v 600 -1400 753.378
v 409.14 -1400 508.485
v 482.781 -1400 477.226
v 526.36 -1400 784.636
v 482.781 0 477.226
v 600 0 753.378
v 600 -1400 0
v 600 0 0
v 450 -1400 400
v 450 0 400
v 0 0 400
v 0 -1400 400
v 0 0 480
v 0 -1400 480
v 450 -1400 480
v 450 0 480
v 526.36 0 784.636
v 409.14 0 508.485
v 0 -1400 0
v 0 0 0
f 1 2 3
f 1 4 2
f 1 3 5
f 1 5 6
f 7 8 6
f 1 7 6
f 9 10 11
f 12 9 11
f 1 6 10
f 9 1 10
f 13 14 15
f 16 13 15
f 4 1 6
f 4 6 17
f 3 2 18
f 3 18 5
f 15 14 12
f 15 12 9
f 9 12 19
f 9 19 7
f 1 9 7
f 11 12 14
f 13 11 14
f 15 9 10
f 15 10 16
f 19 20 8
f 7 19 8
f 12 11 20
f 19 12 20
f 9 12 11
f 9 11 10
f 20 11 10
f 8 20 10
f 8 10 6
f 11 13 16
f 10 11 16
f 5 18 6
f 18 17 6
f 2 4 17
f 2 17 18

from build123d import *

# Parameters (mm, degrees)
F1_DEPTH = 1400
F2_W     = 450
F2_H     = 80
F3_DEPTH = 1400


with BuildPart() as f1:
    # F0 (on Front) → F1 (new body)
    with BuildSketch(Plane.XZ):
        Polygon((0, 400), (0, 0), (600, 0), (600, 400), (450, 400), align=None)
        Polygon((450, 400), (600, 400), (600, 753.3778548736), (482.7806614532, 477.2263988378), align=None)
    extrude(amount=F1_DEPTH)


with BuildPart() as f3:
    # F2 (on face) → F3 (new body)
    with BuildSketch(Plane.XZ.offset(1400)):
        with Locations((225, 440)):
            Rectangle(F2_W, F2_H)
    extrude(amount=-F3_DEPTH)


with BuildPart() as f3b:
    # F2 (on face) → F3, piece 2 (new body)
    with BuildSketch(Plane.XZ.offset(1400)):
        Polygon((409.140273177, 508.484889117), (482.7806614532, 477.2263988378), (600, 753.3778548736), (526.3596117238, 784.6363451527), align=None)
    extrude(amount=-F3_DEPTH)


solid = Compound([f1.part, f3.part, f3b.part])
